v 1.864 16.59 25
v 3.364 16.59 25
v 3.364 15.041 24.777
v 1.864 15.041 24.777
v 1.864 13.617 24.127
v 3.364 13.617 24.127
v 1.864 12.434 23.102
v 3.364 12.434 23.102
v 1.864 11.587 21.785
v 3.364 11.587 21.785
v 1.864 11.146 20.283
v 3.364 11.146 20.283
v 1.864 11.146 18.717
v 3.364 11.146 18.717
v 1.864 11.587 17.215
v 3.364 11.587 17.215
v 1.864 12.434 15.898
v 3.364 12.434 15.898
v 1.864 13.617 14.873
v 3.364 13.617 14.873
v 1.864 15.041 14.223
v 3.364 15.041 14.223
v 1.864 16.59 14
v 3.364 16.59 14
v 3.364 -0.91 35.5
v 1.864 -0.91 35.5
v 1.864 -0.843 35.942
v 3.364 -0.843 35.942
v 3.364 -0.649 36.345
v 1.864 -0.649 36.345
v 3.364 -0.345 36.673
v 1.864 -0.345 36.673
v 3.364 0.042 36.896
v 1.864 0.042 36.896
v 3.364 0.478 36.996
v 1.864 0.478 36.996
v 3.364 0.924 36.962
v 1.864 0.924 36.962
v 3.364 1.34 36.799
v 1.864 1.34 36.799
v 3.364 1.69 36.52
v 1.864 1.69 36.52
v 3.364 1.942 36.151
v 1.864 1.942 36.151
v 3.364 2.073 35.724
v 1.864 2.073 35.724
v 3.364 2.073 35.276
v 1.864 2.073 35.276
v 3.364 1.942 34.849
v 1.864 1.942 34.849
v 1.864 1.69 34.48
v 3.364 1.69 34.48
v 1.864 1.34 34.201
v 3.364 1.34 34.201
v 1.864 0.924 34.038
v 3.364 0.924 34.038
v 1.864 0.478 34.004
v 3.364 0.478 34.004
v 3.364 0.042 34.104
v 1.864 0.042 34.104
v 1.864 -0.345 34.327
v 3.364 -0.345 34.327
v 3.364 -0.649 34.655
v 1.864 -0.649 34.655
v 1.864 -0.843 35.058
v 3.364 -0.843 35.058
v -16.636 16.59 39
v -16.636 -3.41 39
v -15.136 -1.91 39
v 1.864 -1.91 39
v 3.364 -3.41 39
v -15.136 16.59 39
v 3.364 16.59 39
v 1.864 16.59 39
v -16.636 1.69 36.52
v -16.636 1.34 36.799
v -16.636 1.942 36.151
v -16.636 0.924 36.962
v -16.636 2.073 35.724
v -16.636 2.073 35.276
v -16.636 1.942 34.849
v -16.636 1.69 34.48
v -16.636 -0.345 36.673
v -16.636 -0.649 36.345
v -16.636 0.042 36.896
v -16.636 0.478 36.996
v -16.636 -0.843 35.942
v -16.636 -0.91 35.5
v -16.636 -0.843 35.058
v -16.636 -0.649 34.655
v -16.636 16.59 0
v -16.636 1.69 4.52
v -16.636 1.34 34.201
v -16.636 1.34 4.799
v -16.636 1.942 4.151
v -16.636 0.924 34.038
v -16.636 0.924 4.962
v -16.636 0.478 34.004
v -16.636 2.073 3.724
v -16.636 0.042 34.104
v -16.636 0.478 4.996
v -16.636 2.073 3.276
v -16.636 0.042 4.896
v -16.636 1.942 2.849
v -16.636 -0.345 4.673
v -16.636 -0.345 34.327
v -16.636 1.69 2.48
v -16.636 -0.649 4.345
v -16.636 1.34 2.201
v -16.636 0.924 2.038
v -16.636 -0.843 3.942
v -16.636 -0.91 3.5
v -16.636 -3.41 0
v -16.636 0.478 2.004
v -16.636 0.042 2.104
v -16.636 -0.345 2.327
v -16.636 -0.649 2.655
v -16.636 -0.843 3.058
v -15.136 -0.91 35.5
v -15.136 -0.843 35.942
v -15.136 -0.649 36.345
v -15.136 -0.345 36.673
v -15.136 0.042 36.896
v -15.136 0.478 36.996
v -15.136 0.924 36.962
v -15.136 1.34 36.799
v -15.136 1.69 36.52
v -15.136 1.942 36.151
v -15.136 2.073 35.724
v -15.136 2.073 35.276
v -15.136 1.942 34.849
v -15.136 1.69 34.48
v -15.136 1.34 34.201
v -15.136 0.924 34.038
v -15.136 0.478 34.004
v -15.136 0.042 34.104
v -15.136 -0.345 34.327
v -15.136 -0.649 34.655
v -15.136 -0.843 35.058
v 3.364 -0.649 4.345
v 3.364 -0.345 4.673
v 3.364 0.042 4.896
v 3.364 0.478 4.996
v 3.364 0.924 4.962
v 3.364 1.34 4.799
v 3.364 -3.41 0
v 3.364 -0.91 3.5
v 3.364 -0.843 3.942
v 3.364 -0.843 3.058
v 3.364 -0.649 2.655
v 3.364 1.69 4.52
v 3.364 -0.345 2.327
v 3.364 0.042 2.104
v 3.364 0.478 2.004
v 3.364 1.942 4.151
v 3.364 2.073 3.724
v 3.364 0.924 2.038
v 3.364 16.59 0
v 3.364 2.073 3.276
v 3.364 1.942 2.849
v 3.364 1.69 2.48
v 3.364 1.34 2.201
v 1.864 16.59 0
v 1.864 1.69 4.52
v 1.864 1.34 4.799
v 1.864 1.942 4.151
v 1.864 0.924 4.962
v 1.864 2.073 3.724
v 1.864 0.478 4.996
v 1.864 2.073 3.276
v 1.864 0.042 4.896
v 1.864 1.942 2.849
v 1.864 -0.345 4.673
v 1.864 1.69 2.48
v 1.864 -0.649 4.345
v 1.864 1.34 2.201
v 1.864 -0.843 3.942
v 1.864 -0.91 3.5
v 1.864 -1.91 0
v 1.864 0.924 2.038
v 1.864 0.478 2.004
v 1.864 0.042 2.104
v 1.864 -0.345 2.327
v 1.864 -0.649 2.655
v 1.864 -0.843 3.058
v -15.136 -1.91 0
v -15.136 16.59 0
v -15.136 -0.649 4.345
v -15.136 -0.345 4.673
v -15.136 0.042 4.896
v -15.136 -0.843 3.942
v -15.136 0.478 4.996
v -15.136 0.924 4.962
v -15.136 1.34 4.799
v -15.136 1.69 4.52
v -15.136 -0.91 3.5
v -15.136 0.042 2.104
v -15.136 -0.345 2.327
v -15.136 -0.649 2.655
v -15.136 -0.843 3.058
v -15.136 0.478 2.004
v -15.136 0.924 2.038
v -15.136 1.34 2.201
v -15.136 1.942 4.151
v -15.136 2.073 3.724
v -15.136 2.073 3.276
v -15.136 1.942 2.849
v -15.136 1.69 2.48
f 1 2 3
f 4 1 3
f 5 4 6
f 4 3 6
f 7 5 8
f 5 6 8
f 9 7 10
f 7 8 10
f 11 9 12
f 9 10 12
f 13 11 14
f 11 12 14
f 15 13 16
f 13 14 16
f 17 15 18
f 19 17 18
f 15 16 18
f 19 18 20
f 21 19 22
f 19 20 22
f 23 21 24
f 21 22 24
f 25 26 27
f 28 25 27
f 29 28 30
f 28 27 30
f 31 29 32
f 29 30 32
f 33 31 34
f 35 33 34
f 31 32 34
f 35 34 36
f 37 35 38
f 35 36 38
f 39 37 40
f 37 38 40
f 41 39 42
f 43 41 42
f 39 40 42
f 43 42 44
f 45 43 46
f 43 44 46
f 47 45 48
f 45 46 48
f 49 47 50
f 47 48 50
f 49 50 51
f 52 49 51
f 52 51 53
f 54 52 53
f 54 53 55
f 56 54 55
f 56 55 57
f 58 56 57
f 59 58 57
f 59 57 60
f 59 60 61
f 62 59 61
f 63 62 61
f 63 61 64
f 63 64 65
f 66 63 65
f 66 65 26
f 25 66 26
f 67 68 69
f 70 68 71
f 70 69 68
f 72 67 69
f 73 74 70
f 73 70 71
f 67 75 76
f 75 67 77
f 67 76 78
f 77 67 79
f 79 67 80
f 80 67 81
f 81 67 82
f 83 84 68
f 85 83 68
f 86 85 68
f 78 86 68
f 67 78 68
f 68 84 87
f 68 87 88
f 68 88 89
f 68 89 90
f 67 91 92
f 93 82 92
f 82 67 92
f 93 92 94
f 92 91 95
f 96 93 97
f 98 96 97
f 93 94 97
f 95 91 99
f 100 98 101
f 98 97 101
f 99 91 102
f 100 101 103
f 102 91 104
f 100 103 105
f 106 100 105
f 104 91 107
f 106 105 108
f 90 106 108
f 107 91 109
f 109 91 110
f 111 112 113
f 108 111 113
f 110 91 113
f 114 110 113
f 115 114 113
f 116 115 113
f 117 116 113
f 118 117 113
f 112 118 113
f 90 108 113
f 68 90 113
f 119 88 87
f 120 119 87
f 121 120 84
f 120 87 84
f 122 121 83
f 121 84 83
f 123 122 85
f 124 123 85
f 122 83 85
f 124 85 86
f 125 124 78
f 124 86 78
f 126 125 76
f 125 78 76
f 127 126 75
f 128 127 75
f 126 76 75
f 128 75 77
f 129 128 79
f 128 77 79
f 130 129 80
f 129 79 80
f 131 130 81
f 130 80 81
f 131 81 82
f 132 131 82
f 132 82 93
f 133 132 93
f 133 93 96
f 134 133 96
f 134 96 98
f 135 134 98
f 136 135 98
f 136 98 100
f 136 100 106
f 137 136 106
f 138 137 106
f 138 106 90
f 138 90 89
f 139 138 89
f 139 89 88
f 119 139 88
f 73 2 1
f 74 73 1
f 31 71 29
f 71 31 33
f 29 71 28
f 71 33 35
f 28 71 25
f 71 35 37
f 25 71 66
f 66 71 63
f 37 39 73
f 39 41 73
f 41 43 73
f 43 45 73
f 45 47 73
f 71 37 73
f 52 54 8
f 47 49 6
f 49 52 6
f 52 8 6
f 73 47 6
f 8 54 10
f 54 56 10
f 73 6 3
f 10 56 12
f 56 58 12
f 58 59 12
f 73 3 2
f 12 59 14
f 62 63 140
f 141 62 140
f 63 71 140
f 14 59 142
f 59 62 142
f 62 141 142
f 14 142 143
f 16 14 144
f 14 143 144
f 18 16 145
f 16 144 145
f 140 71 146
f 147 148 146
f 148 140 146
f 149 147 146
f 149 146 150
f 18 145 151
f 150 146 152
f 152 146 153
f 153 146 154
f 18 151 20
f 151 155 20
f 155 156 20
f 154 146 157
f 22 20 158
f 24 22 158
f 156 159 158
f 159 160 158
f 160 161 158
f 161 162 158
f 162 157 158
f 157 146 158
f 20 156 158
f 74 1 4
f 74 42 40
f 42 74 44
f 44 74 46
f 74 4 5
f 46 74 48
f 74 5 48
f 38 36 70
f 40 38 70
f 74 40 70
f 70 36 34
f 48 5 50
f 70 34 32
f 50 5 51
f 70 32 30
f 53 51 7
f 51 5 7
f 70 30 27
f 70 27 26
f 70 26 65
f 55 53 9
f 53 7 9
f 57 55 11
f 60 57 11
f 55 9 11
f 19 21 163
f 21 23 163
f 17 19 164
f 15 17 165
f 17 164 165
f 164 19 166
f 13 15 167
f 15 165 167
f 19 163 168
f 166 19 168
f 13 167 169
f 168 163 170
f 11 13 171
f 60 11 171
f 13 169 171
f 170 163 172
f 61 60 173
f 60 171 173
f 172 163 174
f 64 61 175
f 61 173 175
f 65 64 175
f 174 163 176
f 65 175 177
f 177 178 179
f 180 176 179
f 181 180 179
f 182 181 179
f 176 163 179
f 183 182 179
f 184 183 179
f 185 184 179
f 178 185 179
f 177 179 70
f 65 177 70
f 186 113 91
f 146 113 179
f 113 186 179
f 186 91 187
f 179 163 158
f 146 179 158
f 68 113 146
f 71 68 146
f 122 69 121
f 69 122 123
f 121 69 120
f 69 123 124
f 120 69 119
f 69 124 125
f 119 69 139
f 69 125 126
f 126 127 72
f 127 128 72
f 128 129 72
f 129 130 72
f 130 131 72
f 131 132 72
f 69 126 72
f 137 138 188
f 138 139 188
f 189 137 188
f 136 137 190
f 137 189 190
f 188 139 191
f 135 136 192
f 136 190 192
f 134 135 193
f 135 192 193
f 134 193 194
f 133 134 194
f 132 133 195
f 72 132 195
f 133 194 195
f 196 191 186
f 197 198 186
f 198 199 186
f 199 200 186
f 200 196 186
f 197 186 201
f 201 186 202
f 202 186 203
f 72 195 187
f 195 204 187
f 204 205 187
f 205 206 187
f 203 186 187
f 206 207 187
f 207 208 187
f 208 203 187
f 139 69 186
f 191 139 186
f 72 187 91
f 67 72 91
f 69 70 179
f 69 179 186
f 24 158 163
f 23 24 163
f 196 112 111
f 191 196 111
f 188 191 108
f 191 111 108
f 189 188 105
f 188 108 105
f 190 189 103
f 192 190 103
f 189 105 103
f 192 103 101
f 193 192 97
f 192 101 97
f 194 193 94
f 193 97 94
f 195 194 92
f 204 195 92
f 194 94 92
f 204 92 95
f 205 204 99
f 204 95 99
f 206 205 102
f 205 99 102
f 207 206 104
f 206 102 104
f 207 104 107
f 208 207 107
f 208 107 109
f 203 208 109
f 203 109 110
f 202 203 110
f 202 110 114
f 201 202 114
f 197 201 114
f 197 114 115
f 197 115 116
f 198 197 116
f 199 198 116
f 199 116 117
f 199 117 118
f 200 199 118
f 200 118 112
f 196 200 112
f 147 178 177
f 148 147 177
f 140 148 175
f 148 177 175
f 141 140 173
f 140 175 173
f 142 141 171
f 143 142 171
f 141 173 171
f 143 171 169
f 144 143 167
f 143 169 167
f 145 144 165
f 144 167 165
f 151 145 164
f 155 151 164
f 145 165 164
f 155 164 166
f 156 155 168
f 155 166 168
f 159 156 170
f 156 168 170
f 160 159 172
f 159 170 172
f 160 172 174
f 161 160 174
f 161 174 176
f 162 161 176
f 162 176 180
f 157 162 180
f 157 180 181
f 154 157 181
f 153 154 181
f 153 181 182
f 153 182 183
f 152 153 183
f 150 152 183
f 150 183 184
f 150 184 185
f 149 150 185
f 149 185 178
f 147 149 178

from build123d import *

# Parameters (mm, degrees)
EXTRUSION1_DEPTH = 39
ESQUISSE2_R      = 5.5
EXTRUSION2_DEPTH = 10
ESQUISSE3_R      = 1.5
EXTRUSION3_DEPTH = 47.864006287


with BuildPart() as part:
    # Esquisse1 → Extrusion1 (new body)
    with BuildSketch(Plane.XY):
        Polygon((-16.636265327, 16.590210526), (-16.636265327, -3.409789474), (3.363734673, -3.409789474), (3.363734673, 16.590210526), (1.863734673, 16.590210526), (1.863734673, -1.909789474), (-15.136265327, -1.909789474), (-15.136265327, 16.590210526), align=None)
    extrude(amount=EXTRUSION1_DEPTH)

    # Esquisse2 → Extrusion2 (cut)
    with BuildSketch(Plane(origin=(3.363734673, 0, 0), x_dir=(0, 0, -1), z_dir=(1, 0, 0))):
        with Locations((-19.5, 16.590210526)):
            Circle(ESQUISSE2_R)
    extrude(amount=-EXTRUSION2_DEPTH, mode=Mode.SUBTRACT)

    # Esquisse3 → Extrusion3 (cut, through all)
    with BuildSketch(Plane.ZY.offset(16.636265327)):
        with Locations(Location((3.5, 0.590210526, 0), (0, 0, 270))):
            Circle(ESQUISSE3_R)
        with Locations(Location((35.5, 0.590210526, 0), (0, 0, 270))):
            Circle(ESQUISSE3_R)
    extrude(amount=-EXTRUSION3_DEPTH, mode=Mode.SUBTRACT)


solid = part.part
